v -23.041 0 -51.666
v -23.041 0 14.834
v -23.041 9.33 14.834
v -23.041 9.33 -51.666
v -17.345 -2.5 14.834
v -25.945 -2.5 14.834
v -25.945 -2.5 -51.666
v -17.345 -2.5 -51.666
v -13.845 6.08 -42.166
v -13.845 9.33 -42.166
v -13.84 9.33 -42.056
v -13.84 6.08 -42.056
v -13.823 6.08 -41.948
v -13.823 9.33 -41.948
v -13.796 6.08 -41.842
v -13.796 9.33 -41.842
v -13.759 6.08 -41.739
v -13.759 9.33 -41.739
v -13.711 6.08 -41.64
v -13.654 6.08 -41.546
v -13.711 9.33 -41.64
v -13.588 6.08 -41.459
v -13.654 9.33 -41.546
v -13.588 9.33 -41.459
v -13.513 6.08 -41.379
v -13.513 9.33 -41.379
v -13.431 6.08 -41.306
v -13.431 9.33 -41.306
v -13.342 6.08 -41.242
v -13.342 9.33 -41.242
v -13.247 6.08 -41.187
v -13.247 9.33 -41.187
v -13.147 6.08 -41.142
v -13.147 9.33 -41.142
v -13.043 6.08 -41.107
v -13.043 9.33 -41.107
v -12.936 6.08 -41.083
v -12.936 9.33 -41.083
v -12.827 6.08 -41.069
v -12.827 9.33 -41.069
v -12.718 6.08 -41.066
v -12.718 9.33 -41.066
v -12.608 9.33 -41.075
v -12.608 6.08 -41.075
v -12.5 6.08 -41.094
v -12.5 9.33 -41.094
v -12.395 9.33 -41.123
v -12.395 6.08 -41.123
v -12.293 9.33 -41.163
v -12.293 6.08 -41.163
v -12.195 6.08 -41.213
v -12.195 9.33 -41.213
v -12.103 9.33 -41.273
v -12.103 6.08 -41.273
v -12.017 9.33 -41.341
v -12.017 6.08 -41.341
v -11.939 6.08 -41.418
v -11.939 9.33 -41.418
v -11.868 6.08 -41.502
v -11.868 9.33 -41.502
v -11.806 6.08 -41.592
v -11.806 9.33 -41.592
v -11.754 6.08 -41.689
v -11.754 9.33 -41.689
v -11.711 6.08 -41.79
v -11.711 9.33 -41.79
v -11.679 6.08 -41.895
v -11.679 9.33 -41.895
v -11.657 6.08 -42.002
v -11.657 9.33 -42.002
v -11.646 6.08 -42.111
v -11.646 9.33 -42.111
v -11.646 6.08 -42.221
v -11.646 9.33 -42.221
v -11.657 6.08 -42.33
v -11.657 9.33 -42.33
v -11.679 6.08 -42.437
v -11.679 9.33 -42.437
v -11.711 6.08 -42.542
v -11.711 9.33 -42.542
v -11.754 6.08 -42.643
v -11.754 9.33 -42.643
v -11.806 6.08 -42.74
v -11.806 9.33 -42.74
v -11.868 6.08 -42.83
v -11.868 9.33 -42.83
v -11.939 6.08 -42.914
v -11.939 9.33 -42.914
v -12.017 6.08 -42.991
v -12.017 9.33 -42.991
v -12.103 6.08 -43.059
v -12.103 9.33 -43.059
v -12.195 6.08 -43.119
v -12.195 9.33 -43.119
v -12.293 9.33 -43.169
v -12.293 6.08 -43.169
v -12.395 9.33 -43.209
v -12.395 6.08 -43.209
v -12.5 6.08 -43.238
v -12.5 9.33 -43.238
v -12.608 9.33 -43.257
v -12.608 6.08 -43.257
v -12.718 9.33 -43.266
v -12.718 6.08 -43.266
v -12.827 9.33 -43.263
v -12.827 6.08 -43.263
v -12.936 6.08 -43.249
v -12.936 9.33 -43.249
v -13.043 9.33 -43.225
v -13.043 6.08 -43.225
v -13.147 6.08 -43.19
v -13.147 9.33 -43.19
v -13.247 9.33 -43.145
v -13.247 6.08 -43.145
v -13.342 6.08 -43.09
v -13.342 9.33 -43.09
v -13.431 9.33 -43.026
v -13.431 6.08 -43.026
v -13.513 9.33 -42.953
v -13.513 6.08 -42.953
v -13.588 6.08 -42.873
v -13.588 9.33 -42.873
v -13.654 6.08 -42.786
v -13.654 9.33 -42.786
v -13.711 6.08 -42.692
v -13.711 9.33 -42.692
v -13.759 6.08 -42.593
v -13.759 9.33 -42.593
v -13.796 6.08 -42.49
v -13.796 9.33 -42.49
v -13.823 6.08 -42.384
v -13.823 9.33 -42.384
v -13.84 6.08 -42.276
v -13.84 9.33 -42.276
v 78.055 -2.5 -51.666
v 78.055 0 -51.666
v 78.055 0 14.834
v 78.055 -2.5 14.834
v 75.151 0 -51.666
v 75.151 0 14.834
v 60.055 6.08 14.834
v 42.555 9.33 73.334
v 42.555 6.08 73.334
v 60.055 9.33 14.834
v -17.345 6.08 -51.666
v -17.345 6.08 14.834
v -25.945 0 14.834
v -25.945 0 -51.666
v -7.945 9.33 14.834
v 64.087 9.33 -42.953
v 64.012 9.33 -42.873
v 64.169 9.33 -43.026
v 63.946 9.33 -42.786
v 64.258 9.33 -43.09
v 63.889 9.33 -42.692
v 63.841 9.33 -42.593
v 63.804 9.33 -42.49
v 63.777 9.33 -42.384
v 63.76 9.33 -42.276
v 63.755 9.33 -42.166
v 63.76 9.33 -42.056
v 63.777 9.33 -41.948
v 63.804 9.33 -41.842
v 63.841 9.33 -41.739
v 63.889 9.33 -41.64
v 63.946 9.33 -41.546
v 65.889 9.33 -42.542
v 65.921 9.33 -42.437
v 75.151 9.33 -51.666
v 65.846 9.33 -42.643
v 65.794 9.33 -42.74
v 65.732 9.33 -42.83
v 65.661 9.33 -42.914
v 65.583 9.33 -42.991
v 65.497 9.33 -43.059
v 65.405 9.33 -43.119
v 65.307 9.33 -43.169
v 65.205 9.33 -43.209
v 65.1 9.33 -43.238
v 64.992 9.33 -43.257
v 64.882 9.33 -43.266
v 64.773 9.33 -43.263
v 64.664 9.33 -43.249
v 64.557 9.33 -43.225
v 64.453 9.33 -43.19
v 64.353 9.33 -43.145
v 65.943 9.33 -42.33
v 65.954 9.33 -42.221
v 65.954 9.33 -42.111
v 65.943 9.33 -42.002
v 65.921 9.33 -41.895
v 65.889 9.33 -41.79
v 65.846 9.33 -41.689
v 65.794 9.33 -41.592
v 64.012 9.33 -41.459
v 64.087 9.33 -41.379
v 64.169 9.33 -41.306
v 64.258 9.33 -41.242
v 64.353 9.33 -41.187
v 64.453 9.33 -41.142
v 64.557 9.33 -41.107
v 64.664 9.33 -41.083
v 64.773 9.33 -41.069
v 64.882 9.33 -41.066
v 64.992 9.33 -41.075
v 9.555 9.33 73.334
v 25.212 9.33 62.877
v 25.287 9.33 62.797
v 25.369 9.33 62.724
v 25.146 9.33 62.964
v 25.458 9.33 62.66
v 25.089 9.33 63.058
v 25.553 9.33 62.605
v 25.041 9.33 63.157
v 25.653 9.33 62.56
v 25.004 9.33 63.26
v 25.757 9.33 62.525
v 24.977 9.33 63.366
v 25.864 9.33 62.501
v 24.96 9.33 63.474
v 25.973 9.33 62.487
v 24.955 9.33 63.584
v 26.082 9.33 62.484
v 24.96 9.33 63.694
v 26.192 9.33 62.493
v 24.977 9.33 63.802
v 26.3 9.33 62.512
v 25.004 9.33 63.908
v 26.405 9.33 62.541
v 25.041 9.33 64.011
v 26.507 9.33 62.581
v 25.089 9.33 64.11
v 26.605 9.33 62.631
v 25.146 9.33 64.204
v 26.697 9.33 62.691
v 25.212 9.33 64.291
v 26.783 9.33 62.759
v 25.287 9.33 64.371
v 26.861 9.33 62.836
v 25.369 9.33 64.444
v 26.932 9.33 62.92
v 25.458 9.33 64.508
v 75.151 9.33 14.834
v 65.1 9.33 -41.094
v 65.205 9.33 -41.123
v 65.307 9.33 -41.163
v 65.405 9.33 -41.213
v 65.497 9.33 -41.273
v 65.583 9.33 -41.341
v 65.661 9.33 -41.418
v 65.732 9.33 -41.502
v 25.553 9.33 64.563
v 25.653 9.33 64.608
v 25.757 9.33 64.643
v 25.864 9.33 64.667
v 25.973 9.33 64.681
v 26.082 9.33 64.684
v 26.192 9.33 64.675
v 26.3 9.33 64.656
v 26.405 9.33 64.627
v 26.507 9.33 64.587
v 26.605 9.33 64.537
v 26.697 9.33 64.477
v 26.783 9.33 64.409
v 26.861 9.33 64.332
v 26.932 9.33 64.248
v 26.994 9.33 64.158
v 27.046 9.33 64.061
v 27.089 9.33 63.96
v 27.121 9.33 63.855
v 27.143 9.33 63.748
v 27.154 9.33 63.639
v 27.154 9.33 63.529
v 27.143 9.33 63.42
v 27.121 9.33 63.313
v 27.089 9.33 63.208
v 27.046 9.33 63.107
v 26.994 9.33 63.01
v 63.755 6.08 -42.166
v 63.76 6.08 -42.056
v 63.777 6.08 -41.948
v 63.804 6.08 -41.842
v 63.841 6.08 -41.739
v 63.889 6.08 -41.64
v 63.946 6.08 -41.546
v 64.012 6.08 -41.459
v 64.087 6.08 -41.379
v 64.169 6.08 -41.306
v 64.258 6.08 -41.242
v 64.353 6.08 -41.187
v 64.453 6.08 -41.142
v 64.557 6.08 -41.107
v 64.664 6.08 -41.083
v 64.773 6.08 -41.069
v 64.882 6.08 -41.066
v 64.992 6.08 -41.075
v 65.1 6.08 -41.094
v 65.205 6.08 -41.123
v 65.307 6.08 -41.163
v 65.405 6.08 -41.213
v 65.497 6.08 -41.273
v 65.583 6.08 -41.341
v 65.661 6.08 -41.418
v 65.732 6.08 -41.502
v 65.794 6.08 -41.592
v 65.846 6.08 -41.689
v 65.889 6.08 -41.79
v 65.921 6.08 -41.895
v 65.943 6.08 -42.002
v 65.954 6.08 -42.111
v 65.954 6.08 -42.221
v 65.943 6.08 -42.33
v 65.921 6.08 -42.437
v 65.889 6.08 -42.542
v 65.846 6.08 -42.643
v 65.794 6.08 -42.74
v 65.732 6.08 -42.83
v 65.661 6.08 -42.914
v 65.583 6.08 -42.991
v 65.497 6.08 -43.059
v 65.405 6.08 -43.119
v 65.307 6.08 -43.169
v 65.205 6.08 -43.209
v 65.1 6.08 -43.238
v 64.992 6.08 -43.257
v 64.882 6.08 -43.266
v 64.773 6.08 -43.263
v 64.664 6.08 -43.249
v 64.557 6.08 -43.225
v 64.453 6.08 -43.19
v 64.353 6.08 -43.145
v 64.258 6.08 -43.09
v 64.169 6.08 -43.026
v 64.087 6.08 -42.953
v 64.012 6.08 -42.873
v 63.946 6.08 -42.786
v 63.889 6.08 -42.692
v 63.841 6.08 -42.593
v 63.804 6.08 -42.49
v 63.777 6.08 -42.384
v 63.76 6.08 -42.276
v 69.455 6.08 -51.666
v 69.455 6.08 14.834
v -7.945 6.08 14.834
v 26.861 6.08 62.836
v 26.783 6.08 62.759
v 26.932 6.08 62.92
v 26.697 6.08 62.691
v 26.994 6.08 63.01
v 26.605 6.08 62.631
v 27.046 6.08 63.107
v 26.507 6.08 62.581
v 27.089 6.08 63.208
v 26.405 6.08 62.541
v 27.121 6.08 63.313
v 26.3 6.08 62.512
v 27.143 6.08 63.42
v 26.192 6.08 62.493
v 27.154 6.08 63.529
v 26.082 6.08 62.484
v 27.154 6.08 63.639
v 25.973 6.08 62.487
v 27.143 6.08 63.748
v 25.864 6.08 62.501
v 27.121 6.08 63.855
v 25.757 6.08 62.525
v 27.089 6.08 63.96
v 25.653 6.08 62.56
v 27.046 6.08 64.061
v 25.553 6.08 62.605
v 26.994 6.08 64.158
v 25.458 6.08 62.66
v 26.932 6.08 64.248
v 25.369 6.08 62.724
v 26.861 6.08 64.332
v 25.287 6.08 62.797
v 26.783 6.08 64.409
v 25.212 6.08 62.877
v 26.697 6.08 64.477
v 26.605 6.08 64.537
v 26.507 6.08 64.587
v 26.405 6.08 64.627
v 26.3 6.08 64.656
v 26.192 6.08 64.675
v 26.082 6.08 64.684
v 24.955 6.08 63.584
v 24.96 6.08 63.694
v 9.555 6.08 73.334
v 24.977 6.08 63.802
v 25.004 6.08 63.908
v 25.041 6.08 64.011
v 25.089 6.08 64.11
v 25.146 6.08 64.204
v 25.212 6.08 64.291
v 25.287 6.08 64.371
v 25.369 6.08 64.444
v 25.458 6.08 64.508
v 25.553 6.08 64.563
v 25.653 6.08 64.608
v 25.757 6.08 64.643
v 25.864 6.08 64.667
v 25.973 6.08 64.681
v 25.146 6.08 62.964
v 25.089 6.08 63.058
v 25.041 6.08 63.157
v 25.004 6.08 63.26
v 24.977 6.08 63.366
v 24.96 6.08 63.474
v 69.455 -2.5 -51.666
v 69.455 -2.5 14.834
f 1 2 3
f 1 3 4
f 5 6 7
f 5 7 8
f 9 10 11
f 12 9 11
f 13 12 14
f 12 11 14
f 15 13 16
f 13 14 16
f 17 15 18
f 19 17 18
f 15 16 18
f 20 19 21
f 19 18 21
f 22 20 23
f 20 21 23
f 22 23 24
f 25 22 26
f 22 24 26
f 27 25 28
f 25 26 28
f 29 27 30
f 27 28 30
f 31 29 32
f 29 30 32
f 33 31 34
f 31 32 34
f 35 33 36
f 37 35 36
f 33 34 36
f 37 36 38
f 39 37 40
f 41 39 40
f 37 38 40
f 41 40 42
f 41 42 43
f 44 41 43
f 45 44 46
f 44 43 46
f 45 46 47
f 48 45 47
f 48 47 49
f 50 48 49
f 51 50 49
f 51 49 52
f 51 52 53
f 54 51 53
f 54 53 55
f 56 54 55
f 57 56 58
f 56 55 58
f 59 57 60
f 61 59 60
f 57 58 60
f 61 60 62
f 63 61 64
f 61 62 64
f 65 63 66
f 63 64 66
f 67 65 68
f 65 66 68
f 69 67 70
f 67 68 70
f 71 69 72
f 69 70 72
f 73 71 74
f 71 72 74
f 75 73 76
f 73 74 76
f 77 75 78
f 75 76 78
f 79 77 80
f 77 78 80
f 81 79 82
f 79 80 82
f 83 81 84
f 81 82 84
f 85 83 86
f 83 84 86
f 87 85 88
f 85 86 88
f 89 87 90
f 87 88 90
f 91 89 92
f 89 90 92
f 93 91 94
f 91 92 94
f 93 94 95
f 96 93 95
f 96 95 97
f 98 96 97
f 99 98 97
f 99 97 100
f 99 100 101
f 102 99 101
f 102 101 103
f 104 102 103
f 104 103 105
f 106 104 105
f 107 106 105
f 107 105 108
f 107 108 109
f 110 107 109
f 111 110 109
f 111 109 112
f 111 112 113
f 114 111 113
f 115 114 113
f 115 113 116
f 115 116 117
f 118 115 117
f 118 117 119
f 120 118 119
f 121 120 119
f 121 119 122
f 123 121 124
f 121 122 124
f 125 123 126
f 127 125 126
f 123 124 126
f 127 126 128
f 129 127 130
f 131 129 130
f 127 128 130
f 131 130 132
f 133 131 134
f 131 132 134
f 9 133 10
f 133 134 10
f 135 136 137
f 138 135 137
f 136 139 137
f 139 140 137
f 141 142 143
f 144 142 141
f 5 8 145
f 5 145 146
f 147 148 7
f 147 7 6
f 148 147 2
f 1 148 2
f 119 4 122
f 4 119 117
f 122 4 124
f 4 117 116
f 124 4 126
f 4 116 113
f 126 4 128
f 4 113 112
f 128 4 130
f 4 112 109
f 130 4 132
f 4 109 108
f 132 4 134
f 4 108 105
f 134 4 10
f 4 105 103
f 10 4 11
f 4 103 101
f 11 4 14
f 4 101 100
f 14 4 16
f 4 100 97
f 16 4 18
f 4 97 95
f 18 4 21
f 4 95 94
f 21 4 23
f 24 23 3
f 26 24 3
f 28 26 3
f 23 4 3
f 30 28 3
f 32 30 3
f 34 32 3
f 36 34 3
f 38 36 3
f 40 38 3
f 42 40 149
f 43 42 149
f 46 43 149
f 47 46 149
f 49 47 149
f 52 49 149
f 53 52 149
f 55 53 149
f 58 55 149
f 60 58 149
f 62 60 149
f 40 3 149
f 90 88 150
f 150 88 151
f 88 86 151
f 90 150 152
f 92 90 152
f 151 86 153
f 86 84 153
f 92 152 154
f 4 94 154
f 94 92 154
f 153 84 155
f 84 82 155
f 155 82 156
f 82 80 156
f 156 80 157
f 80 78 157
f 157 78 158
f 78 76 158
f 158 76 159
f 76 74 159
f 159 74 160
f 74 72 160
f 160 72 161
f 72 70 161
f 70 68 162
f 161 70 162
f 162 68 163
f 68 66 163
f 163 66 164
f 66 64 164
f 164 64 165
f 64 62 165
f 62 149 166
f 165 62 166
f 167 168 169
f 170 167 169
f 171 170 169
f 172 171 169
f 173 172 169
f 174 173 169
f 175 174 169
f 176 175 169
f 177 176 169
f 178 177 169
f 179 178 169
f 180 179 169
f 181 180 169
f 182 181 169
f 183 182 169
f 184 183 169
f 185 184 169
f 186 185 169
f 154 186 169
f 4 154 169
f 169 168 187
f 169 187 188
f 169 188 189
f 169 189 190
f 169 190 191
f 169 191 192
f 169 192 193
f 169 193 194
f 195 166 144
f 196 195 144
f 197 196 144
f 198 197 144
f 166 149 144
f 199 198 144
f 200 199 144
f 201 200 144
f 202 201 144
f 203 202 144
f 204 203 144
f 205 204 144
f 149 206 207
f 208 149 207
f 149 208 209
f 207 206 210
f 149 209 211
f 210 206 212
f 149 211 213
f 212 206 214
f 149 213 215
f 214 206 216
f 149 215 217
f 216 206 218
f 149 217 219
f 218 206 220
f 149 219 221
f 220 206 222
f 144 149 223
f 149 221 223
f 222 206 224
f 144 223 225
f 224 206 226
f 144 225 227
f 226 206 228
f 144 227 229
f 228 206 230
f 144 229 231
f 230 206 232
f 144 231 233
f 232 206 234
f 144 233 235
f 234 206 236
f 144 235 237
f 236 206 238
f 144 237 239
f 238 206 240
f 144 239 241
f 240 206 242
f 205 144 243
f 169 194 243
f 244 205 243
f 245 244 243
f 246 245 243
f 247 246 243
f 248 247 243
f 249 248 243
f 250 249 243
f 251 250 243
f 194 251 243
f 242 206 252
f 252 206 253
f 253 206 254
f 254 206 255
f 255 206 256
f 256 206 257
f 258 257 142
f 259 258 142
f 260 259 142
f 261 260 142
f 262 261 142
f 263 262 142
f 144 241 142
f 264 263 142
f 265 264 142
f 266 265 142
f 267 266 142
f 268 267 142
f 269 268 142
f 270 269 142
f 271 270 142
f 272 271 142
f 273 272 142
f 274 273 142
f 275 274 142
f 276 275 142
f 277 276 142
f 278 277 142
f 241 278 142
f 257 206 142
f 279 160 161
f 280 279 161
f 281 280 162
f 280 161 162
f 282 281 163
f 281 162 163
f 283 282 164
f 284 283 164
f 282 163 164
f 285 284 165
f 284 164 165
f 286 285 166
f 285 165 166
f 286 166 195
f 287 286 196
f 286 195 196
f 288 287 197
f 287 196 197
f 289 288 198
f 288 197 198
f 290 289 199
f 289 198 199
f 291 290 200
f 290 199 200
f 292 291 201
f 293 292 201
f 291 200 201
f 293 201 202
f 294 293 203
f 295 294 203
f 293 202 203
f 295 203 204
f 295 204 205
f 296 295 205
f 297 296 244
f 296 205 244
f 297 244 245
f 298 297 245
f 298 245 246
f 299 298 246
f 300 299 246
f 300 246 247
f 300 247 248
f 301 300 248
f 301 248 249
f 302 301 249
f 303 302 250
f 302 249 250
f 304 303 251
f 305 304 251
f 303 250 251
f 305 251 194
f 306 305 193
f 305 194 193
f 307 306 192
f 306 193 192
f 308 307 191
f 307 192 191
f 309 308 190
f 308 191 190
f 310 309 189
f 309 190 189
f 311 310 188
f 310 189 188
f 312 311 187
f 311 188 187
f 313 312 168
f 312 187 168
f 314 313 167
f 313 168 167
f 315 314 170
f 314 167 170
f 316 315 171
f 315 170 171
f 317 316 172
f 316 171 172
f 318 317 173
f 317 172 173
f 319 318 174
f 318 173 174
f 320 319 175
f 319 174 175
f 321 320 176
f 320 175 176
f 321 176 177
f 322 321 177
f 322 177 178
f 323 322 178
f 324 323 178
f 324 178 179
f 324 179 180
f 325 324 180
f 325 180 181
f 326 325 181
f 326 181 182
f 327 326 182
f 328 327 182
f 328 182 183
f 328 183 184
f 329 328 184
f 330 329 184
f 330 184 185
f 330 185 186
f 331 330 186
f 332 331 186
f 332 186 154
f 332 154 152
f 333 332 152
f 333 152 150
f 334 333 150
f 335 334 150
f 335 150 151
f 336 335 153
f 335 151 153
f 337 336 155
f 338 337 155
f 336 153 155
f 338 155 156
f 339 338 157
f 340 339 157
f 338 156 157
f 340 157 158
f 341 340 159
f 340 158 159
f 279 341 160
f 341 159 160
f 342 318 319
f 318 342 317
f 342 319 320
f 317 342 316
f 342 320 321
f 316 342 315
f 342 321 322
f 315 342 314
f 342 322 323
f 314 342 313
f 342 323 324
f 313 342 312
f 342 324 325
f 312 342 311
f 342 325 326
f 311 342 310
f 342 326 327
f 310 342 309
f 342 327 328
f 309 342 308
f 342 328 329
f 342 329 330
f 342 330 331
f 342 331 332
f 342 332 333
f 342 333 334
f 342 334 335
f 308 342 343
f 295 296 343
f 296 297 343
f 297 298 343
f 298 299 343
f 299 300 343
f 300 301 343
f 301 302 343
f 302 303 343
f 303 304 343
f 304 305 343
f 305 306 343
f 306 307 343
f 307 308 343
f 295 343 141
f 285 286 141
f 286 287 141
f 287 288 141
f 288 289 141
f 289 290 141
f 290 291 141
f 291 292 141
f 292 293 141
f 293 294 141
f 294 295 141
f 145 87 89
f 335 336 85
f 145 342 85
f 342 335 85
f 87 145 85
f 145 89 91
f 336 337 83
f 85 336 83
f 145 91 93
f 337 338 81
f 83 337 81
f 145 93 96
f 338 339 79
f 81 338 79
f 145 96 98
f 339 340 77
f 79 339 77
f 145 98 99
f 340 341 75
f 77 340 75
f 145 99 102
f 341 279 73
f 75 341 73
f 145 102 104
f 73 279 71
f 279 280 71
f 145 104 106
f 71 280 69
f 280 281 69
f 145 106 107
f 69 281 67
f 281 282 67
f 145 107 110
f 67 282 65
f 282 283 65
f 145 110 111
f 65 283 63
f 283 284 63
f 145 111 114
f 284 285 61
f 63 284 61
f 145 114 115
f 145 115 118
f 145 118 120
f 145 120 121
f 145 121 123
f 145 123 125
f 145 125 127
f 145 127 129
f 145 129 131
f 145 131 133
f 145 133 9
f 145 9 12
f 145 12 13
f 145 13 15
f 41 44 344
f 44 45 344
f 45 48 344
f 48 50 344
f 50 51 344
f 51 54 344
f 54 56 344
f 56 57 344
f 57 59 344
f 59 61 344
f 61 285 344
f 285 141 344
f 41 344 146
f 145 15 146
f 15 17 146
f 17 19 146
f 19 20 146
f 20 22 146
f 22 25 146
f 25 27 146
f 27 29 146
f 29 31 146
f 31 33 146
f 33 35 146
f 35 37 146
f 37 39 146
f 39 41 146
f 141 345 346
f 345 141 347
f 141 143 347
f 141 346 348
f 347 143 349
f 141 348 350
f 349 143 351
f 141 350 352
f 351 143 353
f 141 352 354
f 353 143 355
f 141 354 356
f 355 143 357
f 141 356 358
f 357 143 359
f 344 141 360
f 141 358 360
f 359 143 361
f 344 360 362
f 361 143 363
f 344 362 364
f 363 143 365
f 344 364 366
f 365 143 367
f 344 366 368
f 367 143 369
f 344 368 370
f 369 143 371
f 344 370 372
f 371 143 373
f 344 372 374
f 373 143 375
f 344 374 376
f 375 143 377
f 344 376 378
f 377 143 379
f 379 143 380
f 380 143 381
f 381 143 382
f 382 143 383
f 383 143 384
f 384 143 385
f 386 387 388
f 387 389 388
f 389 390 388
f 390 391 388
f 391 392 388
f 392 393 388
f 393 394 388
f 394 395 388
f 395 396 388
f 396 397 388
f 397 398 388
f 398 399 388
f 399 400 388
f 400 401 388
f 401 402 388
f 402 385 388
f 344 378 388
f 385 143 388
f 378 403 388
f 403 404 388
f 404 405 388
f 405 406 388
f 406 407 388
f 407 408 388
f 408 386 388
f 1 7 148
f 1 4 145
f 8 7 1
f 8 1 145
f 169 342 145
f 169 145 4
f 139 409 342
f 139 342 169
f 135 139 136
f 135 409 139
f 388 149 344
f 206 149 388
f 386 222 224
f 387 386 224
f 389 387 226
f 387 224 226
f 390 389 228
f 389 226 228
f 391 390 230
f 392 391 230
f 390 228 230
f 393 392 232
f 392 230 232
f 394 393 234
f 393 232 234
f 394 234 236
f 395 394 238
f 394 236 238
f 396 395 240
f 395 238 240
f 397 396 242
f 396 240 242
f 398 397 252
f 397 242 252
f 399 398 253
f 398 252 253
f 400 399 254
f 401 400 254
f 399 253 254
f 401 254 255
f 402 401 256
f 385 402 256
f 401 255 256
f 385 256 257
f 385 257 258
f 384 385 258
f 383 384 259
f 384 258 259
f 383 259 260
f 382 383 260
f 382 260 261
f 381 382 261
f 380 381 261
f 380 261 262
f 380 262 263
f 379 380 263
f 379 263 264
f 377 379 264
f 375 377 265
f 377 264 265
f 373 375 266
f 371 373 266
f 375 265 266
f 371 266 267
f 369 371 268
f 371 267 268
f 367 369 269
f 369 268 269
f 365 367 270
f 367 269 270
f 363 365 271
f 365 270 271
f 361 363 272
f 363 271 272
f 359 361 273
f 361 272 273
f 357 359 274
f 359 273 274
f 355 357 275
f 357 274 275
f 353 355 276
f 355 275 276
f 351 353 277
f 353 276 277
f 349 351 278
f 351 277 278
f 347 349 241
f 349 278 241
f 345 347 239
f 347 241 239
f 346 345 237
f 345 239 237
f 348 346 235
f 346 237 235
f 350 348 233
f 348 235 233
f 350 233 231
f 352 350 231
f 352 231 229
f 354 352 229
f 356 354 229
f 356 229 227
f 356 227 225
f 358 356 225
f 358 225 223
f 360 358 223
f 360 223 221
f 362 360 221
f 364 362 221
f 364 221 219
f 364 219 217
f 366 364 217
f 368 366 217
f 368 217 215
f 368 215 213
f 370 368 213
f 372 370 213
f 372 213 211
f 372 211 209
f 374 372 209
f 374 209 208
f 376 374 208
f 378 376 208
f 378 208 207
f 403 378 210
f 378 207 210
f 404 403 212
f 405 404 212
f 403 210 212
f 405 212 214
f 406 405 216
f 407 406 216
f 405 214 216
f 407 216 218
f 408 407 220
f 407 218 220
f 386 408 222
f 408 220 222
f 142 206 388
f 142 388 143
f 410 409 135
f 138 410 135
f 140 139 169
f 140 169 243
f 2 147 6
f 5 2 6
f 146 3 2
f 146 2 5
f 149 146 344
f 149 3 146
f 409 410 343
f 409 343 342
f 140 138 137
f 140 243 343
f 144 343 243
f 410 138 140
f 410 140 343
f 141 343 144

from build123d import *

# Parameters (mm, degrees)
F0_W     = 2.9037779868
F0_H     = 66.5
F1_DEPTH = 2.5
F2_DEPTH = 9.33
F3_R     = 1.1
F4_DEPTH = 3.25


# Not quite as in the source:
# - a feature names something its author has since deleted; it is built from what else it names


with BuildPart() as f1:
    # F0 (on Front) → F1 (new body)
    with BuildSketch(Plane.XZ):
        with Locations((-24.4931335896, -18.415993683)):
            Rectangle(F0_W, F0_H)
        Polygon((-20.845022583, 14.834006317), (-23.0412445962, 14.834006317), (-23.0412445962, -51.665993683), (-17.345022583, -51.665993683), (-17.345022583, 14.834006317), align=None)
    extrude(amount=F1_DEPTH)

    # F0 (on Front) → F2, piece 2 (join)
    with BuildSketch(Plane.XZ):
        Polygon((-20.845022583, 14.834006317), (-23.0412445962, 14.834006317), (-23.0412445962, -51.665993683), (-17.345022583, -51.665993683), (-17.345022583, 14.834006317), align=None)
    extrude(amount=-F2_DEPTH)



with BuildPart() as f1b:
    # F0 (on Front) → F1, piece 2 (new body)
    with BuildSketch(Plane.XZ):
        with Locations((76.6030884236, -18.415993683)):
            Rectangle(F0_W, F0_H)
        Polygon((72.954977417, 14.834006317), (69.454977417, 14.834006317), (69.454977417, -51.665993683), (75.1511994302, -51.665993683), (75.1511994302, 14.834006317), align=None)
    extrude(amount=F1_DEPTH)

    # F0 (on Front) → F2 (join)
    with BuildSketch(Plane.XZ):
        Polygon((72.954977417, 14.834006317), (69.454977417, 14.834006317), (69.454977417, -51.665993683), (75.1511994302, -51.665993683), (75.1511994302, 14.834006317), align=None)
    extrude(amount=-F2_DEPTH)


with BuildPart() as f1_1:
    add(f1.part)

    add(f1b.part)  # F4 merges F1b
    # F3 (on face) → F4 (join)
    with BuildSketch(Plane(origin=(0, 9.33, 0), x_dir=(-1, 0, 0), z_dir=(0, 1, 0))):
        Polygon((17.345022583, -51.665993683), (17.345022583, 14.834006317), (7.945022583, 14.834006317), (-26.054977417, 14.834006317), (-60.054977417, 14.834006317), (-75.1511994302, 14.834006317), (-75.1511994302, -51.665993683), align=None)
        with Locations((-64.854977417, -42.165993683)):
            Circle(F3_R, mode=Mode.SUBTRACT)
        with Locations((12.745022583, -42.165993683)):
            Circle(F3_R, mode=Mode.SUBTRACT)
        Polygon((-26.054977417, 14.834006317), (7.945022583, 14.834006317), (-9.554977417, 73.334006317), (-26.054977417, 73.334006317), (-42.554977417, 73.334006317), (-60.054977417, 14.834006317), align=None)
        with Locations((-26.054977417, 63.584006317)):
            Circle(F3_R, mode=Mode.SUBTRACT)
    extrude(amount=-F4_DEPTH)


solid = f1_1.part
